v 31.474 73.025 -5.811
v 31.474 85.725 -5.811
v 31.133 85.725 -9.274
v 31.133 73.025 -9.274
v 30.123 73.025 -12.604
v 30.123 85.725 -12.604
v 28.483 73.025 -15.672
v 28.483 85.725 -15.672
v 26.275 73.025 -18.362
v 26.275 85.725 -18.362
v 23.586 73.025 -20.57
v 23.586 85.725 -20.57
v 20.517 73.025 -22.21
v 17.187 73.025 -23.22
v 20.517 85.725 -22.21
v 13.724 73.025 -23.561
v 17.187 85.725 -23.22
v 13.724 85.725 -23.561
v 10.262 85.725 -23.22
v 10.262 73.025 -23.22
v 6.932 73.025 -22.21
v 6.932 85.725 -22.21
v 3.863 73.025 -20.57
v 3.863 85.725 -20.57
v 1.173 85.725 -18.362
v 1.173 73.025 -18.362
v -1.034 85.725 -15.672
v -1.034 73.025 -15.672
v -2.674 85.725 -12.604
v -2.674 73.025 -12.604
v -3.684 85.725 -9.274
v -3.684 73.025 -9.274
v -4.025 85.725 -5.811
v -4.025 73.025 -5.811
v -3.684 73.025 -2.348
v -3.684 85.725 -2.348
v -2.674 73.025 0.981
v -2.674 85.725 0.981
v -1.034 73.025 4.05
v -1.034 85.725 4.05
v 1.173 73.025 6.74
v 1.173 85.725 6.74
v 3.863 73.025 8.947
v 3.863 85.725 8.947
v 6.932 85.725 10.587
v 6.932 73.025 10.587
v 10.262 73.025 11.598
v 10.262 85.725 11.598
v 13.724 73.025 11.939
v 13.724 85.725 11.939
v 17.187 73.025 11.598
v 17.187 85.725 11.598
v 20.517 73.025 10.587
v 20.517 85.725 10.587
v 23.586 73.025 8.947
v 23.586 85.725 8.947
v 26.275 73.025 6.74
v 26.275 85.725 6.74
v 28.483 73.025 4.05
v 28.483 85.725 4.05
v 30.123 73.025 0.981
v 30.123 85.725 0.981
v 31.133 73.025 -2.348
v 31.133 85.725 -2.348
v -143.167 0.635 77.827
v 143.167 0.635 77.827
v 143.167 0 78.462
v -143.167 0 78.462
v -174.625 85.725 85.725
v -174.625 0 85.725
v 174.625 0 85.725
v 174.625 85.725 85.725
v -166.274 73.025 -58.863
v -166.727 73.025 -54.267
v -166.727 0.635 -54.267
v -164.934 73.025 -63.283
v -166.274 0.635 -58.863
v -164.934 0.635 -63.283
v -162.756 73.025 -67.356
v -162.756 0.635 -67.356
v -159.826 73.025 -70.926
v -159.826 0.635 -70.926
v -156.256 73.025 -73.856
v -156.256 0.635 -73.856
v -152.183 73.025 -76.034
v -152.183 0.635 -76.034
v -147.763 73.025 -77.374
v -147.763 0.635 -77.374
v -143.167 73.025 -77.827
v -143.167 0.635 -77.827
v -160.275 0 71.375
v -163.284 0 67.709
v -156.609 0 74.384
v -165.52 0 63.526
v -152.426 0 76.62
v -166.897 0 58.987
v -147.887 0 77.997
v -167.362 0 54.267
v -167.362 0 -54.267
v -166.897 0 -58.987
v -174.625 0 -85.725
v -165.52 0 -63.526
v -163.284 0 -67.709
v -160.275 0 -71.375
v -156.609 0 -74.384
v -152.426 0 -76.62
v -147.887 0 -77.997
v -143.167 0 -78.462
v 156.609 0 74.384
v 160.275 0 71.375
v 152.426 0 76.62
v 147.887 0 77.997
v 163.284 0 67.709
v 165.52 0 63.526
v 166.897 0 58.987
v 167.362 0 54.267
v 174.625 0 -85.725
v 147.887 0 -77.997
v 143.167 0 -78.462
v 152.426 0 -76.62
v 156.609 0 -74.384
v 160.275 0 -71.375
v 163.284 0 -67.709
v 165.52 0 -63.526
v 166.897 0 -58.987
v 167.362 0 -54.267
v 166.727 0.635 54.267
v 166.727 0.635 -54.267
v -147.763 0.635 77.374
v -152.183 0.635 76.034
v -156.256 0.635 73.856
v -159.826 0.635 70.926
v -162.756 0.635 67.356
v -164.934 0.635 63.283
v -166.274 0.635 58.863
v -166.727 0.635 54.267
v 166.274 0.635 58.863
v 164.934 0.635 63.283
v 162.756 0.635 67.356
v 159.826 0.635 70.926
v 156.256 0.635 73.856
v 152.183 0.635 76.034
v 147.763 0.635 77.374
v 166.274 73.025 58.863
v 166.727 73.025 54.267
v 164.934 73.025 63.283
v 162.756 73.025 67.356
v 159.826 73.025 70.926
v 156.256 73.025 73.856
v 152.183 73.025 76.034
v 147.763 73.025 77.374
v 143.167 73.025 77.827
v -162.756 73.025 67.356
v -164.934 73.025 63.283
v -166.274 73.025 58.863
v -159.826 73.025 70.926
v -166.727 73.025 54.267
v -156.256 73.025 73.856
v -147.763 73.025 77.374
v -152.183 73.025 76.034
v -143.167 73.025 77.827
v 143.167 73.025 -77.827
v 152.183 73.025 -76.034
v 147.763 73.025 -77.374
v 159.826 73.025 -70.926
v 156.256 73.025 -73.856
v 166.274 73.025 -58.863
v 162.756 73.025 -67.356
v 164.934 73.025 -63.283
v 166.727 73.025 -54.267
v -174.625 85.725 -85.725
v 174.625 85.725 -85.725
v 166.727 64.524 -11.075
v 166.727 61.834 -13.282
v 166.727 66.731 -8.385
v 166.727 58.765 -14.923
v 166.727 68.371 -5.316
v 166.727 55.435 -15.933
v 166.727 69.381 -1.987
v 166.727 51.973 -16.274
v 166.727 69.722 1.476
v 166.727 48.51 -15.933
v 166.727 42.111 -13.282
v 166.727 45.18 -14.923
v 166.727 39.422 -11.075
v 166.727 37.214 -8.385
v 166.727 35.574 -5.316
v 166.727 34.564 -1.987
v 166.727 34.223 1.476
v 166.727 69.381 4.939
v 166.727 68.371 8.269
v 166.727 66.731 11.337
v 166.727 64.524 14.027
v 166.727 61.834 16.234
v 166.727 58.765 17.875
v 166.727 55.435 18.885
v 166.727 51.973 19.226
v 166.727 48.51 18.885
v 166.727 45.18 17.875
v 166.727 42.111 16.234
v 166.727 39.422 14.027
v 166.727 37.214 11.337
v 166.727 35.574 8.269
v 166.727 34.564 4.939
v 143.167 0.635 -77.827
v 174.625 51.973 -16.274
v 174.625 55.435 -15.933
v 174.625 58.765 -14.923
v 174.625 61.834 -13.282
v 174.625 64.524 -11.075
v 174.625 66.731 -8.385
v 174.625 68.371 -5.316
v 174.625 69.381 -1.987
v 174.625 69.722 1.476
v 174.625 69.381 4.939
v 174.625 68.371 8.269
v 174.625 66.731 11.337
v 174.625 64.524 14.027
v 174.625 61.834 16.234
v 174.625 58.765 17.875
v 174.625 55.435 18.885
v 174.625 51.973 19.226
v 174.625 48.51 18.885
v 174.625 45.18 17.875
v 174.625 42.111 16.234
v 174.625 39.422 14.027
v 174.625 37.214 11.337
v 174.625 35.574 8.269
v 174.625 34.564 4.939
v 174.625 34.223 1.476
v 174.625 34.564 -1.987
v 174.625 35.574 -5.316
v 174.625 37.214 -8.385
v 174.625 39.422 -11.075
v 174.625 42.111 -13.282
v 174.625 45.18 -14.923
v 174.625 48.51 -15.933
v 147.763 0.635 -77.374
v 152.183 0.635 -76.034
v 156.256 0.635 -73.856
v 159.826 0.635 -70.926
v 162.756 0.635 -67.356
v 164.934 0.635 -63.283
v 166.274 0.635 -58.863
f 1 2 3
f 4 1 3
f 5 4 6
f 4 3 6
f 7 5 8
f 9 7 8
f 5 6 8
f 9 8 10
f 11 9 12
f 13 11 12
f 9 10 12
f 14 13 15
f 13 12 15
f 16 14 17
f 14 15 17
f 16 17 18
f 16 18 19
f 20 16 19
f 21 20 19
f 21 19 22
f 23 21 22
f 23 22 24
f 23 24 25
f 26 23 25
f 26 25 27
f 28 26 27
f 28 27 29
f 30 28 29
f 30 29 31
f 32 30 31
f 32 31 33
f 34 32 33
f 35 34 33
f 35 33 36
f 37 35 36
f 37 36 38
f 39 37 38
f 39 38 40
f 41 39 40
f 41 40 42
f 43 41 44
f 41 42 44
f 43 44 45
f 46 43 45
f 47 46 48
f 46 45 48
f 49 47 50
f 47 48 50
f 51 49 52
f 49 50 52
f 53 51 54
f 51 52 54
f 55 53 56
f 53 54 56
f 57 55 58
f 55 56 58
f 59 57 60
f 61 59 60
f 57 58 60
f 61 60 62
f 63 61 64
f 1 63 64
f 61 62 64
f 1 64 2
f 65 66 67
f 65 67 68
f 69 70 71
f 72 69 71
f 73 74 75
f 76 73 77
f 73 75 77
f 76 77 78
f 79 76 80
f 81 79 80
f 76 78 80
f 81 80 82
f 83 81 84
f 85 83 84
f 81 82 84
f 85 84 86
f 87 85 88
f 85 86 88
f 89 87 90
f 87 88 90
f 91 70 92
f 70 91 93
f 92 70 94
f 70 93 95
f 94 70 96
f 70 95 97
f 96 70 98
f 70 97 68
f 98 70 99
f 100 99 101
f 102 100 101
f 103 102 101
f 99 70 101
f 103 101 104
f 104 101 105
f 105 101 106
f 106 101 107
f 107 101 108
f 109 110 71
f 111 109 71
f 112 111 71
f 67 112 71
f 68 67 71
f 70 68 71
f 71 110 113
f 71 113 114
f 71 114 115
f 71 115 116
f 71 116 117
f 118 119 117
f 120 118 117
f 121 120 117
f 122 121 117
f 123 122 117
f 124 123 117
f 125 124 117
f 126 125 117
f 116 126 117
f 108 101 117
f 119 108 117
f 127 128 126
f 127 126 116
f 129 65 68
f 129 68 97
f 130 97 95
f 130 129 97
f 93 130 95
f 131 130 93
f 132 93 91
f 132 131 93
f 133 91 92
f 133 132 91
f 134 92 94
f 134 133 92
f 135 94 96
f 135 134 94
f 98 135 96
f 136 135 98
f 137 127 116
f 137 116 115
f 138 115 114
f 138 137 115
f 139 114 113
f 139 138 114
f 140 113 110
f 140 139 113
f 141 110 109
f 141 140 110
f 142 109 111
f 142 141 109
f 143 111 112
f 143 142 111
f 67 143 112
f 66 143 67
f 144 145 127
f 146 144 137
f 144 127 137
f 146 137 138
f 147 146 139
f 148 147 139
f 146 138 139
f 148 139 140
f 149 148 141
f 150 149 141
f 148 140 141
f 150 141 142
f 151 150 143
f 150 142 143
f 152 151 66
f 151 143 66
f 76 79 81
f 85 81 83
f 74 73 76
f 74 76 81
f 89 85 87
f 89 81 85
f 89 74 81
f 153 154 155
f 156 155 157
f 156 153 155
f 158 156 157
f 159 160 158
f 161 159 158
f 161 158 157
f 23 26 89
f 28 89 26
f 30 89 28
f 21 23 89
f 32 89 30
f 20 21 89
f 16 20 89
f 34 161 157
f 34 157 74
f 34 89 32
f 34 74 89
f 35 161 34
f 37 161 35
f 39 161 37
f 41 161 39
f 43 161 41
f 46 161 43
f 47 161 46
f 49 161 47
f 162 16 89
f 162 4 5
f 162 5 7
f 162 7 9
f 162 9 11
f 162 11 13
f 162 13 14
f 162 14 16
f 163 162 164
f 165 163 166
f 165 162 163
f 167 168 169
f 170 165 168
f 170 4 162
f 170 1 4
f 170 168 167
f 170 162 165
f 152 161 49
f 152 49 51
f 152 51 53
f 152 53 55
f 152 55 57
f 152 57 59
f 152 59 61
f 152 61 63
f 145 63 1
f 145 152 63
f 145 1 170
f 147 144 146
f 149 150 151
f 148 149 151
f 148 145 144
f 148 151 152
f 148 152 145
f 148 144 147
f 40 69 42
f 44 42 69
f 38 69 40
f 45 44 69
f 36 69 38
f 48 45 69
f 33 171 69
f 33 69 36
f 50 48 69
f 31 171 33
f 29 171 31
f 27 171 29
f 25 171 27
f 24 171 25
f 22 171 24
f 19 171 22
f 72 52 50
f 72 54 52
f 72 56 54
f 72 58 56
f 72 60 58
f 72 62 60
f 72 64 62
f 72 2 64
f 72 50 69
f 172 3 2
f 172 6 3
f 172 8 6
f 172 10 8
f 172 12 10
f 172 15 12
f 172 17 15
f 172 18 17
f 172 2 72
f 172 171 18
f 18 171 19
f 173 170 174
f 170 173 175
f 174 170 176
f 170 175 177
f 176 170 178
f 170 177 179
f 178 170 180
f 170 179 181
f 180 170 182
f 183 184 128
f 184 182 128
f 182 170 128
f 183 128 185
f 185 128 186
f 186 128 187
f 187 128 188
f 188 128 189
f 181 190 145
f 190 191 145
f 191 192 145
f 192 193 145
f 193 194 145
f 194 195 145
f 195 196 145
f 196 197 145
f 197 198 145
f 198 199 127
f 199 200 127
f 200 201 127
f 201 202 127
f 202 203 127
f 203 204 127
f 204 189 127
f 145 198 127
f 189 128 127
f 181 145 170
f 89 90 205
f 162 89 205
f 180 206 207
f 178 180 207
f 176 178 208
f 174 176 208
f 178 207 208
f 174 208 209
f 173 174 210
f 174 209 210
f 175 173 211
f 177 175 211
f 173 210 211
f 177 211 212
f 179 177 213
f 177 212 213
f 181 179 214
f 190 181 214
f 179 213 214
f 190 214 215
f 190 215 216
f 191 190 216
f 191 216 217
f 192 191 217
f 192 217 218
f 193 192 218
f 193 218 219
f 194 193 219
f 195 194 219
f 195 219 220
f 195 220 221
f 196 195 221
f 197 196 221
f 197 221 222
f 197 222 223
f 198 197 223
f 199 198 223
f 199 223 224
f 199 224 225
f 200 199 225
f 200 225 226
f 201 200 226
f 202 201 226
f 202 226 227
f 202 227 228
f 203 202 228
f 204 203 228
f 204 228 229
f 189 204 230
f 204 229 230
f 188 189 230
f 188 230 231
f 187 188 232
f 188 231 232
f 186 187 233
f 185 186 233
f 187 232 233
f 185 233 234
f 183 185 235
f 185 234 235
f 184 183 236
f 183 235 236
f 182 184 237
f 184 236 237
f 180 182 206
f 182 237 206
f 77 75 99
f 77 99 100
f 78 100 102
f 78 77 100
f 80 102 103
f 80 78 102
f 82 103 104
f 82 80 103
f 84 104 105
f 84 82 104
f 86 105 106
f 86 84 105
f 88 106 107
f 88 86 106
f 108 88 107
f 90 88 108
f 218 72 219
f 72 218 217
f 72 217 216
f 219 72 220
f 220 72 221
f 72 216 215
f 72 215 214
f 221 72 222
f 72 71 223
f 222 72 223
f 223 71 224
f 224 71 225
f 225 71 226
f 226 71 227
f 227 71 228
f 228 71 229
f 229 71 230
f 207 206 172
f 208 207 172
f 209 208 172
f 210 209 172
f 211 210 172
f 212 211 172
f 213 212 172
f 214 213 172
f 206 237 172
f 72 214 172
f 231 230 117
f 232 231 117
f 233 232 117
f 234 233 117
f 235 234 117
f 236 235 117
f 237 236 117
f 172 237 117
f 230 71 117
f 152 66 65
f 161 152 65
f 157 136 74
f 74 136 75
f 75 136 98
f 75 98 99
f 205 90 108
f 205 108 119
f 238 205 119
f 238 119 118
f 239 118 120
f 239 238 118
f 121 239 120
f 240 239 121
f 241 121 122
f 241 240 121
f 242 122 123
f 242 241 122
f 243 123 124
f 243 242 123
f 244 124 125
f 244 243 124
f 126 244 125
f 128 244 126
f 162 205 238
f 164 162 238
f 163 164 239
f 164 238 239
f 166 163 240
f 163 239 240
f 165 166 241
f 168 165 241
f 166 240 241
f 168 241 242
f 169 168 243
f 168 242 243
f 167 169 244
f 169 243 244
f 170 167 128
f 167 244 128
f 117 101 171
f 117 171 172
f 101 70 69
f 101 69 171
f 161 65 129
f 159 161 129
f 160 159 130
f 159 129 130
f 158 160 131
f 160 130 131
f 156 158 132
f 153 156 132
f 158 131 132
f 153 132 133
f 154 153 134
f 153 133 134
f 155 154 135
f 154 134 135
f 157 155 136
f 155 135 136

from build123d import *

# Parameters (mm, degrees)
SKETCH1_W           = 349.25
SKETCH1_H           = 171.45
BOSS_EXTRUDE1_DEPTH = 85.725
CUT_EXTRUDE1_DEPTH  = 73.025
CUT_EXTRUDE2_REACH  = 87.725
SKETCH5_R           = 17.749738032
CUT_EXTRUDE3_REACH  = 351.25
SKETCH6_R           = 17.749738032
CHAMFER1_SIZE       = 0.635


with BuildPart() as part:
    # Sketch1 → Boss-Extrude1 (new body)
    with BuildSketch(Plane(origin=(0, 0, 0), x_dir=(1, 0, 0), z_dir=(0, 1, 0))):
        Rectangle(SKETCH1_W, SKETCH1_H)
    extrude(amount=BOSS_EXTRUDE1_DEPTH)

    # Sketch2 → Cut-Extrude1 (cut)
    with BuildSketch(Plane.XZ):
        with BuildLine():
            Line((143.166535328, 77.827138829), (-143.166535328, 77.827138829))
            ThreePointArc((-143.166535328, 77.827138829), (-159.826397833, 70.926397833), (-166.727138829, 54.266535328))
            Line((-166.727138829, 54.266535328), (-166.727138829, -54.266535328))
            ThreePointArc((-166.727138829, -54.266535328), (-159.826397833, -70.926397833), (-143.166535328, -77.827138829))
            Line((-143.166535328, -77.827138829), (143.166535328, -77.827138829))
            ThreePointArc((143.166535328, -77.827138829), (159.826397833, -70.926397833), (166.727138829, -54.266535328))
            Line((166.727138829, -54.266535328), (166.727138829, 54.266535328))
            ThreePointArc((166.727138829, 54.266535328), (159.826397833, 70.926397833), (143.166535328, 77.827138829))
        make_face()
    extrude(amount=-CUT_EXTRUDE1_DEPTH, mode=Mode.SUBTRACT)

    # Sketch5 → Cut-Extrude2 (cut, up to next)
    with BuildSketch(Plane(origin=(0, 85.725, 0), x_dir=(1, 0, 0), z_dir=(0, 1, 0)), mode=Mode.PRIVATE) as cut_extrude2_sk1:
        with Locations((13.724333657, 5.811180929)):
            Circle(SKETCH5_R)
    cut_extrude2_tool1 = extrude(cut_extrude2_sk1.sketch, amount=-CUT_EXTRUDE2_REACH, mode=Mode.PRIVATE) & part.part
    add(cut_extrude2_tool1.solids().sort_by_distance((13.724334, 85.725, -5.811181))[0], mode=Mode.SUBTRACT)

    # Sketch6 → Cut-Extrude3 (cut, up to next)
    with BuildSketch(Plane(origin=(174.625, 0, 0), x_dir=(0, 0, -1), z_dir=(1, 0, 0)), mode=Mode.PRIVATE) as cut_extrude3_sk1:
        with Locations((-1.47611621, 51.972642264)):
            Circle(SKETCH6_R)
    cut_extrude3_tool1 = extrude(cut_extrude3_sk1.sketch, amount=-CUT_EXTRUDE3_REACH, mode=Mode.PRIVATE) & part.part
    add(cut_extrude3_tool1.solids().sort_by_distance((174.625, 51.972642, 1.476116))[0], mode=Mode.SUBTRACT)

    # Chamfer1
    chamfer1_edges = [part.edges().sort_by_distance(p)[0] for p in [
        (159.826397833, 0, 70.926397833),
        (159.826397833, 0, -70.926397833),
        (-159.826397833, 0, -70.926397833),
        (0, 0, 77.827138829),
        (-159.826397833, 0, 70.926397833),
        (-166.727138829, 0, 0),
        (0, 0, -77.827138829),
        (166.727138829, 0, 0),
    ]]
    chamfer(chamfer1_edges, length=CHAMFER1_SIZE)


solid = part.part
